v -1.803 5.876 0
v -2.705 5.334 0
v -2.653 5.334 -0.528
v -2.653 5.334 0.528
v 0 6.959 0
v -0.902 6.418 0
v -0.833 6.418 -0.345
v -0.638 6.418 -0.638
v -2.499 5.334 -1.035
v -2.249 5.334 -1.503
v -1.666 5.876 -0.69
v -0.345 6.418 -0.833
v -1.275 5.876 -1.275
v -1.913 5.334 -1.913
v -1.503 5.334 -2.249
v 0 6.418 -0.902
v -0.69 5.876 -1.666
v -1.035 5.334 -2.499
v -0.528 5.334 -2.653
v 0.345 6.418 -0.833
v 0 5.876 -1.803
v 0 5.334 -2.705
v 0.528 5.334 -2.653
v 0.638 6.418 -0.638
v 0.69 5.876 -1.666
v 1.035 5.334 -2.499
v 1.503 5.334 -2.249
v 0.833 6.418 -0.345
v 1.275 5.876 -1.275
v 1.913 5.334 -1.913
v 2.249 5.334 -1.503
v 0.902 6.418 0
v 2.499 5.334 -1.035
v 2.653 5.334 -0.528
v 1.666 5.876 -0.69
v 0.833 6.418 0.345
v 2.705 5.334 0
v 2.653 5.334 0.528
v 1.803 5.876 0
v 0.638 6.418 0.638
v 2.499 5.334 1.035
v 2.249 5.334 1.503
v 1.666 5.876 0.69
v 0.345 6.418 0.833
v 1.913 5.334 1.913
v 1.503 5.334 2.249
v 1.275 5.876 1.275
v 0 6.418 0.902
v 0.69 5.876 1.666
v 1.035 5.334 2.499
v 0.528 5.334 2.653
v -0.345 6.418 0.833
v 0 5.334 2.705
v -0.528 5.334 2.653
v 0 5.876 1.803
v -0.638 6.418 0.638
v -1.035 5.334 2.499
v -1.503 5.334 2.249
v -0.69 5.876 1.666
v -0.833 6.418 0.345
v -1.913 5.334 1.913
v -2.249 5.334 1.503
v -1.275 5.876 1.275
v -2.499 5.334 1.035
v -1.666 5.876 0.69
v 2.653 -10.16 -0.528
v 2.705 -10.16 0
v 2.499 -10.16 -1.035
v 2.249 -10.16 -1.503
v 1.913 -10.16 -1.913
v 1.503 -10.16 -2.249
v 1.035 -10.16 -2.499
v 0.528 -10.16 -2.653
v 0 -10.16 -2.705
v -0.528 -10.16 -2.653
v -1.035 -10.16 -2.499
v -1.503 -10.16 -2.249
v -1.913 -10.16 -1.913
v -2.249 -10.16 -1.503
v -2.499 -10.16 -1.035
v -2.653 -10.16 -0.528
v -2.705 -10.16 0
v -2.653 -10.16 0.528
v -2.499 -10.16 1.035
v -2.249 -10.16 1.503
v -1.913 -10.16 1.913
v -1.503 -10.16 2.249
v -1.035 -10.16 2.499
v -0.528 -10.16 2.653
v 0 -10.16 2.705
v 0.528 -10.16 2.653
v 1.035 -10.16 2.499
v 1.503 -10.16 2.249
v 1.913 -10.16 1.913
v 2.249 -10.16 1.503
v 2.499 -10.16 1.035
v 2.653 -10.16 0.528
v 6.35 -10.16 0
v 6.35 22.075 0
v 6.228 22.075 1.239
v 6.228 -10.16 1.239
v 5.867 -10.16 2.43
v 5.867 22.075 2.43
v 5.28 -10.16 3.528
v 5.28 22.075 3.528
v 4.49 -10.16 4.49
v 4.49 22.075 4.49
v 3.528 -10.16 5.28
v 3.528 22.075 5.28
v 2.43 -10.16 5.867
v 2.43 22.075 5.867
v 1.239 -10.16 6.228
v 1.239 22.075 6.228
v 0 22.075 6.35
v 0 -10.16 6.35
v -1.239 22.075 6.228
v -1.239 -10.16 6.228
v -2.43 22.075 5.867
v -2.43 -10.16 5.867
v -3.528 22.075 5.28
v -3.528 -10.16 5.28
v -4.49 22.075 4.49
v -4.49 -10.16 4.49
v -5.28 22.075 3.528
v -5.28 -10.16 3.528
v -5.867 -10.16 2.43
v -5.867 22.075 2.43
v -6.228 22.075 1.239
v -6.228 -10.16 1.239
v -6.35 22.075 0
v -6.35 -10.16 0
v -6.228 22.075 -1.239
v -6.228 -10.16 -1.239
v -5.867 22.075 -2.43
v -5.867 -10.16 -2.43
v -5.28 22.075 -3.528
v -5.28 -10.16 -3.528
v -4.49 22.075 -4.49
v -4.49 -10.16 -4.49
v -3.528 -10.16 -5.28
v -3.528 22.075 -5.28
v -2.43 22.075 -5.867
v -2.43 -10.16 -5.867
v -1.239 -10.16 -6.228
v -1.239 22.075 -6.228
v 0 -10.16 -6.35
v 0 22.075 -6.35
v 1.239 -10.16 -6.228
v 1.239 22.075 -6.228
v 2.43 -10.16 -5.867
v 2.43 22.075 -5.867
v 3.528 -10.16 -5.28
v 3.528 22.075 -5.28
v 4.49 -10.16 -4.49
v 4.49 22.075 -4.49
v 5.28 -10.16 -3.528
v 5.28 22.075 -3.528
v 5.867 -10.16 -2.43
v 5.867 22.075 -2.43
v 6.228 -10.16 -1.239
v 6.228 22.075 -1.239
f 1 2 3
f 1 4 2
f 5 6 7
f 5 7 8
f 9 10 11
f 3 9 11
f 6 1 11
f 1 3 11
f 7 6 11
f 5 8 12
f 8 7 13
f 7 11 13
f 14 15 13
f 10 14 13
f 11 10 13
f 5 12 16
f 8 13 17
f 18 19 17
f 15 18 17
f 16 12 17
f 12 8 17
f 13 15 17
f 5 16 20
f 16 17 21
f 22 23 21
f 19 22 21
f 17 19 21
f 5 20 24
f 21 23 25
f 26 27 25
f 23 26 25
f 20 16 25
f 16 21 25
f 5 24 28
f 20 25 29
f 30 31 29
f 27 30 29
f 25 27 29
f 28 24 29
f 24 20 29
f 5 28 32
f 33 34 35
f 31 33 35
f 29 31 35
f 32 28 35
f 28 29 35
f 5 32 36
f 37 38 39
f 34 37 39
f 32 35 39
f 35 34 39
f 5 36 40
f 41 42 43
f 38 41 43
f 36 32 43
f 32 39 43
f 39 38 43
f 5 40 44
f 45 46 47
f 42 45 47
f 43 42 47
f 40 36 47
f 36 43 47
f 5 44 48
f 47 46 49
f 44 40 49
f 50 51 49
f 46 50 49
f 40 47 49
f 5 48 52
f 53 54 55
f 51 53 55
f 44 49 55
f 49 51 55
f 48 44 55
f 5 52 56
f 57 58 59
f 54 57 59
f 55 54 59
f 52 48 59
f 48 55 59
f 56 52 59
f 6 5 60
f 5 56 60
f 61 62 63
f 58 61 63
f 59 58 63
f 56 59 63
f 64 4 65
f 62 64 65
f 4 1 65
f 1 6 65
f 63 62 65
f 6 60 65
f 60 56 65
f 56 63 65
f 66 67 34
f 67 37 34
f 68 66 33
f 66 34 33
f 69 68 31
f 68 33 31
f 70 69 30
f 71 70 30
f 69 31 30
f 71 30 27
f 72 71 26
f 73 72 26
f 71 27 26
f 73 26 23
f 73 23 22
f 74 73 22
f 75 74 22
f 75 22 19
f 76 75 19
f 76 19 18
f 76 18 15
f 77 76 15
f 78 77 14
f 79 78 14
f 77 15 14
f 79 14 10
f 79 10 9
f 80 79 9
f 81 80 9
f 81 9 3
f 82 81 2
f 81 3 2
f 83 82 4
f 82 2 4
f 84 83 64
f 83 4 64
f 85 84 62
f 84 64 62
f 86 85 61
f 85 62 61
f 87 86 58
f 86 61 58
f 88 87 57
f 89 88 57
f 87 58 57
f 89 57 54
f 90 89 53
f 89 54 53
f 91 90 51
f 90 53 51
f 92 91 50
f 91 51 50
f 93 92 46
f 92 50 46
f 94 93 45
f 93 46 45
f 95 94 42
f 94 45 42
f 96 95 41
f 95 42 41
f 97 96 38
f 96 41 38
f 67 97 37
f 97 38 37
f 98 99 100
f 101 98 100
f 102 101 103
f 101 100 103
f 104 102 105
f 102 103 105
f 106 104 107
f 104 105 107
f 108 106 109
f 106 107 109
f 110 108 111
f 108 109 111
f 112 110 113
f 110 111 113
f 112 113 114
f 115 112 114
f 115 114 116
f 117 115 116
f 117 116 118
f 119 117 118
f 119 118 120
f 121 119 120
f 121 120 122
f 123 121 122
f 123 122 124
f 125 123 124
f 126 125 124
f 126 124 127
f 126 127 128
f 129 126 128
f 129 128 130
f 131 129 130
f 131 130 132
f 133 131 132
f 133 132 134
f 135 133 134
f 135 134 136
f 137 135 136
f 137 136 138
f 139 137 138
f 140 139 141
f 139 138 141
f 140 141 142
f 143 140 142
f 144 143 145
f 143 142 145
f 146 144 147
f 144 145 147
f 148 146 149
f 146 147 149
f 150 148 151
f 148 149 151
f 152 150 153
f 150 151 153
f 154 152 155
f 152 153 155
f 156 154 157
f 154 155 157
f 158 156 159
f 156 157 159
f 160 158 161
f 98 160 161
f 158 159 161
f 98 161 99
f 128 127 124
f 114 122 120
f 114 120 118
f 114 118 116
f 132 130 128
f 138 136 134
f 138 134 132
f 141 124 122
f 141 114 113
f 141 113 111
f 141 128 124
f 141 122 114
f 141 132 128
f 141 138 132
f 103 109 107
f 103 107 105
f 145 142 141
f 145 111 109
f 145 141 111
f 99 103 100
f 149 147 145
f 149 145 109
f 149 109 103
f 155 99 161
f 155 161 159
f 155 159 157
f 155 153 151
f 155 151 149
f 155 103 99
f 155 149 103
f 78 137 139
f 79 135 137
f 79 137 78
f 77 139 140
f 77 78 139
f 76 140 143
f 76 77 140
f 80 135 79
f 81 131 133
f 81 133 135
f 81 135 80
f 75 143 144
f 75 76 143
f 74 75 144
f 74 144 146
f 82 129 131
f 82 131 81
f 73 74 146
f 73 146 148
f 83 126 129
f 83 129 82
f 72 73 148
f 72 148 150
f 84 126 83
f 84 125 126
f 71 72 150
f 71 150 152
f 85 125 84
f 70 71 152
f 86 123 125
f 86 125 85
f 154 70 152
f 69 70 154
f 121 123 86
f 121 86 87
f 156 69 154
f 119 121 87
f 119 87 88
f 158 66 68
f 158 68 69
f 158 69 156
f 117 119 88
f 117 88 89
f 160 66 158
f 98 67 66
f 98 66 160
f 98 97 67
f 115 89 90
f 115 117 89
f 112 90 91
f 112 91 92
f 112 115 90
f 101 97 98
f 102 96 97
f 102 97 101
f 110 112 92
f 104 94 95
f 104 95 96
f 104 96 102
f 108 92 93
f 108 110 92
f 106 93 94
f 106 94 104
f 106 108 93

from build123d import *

# Parameters (mm, degrees)
SKETCH1_R                   = 6.35
BOSS_EXTRUDE1_DEPTH         = 22.07514
SKETCH2_R                   = 6.35
BOSS_EXTRUDE2_DEPTH         = 10.16
F_1_4_28_TAPPED_HOLE1_D     = 5.4102
F_1_4_28_TAPPED_HOLE1_DEPTH = 15.494
F_1_4_28_TAPPED_HOLE1_TIP   = 1.625388061
SKETCH5_R                   = 6.35
BOSS_EXTRUDE3_DEPTH         = 3.175


with BuildPart() as part:
    # Sketch1 → Boss-Extrude1 (new body)
    with BuildSketch(Plane(origin=(0, 0, 0), x_dir=(1, 0, 0), z_dir=(0, 1, 0))):
        Circle(SKETCH1_R)
    extrude(amount=BOSS_EXTRUDE1_DEPTH)

    # Sketch2 → Boss-Extrude2 (add)
    with BuildSketch(Plane.XZ):
        Circle(SKETCH2_R)
    extrude(amount=BOSS_EXTRUDE2_DEPTH)

    # 1/4-28 Tapped Hole1
    with Locations(Plane(origin=(0, -10.16, 0), x_dir=(-1, 0, 0), z_dir=(0, -1, 0))):
        with Locations((0, 0)):
            Hole(F_1_4_28_TAPPED_HOLE1_D / 2, depth=F_1_4_28_TAPPED_HOLE1_DEPTH)
            with Locations((0, 0, -(F_1_4_28_TAPPED_HOLE1_DEPTH + F_1_4_28_TAPPED_HOLE1_TIP / 2))):  # 118° drill point
                Cone(0, F_1_4_28_TAPPED_HOLE1_D / 2, F_1_4_28_TAPPED_HOLE1_TIP, mode=Mode.SUBTRACT)

    # Sketch5 → Boss-Extrude3 (add)
    with BuildSketch(Plane(origin=(0, 22.07514, 0), x_dir=(1, 0, 0), z_dir=(0, 1, 0))):
        Circle(SKETCH5_R)
    extrude(amount=-BOSS_EXTRUDE3_DEPTH)


solid = part.part
